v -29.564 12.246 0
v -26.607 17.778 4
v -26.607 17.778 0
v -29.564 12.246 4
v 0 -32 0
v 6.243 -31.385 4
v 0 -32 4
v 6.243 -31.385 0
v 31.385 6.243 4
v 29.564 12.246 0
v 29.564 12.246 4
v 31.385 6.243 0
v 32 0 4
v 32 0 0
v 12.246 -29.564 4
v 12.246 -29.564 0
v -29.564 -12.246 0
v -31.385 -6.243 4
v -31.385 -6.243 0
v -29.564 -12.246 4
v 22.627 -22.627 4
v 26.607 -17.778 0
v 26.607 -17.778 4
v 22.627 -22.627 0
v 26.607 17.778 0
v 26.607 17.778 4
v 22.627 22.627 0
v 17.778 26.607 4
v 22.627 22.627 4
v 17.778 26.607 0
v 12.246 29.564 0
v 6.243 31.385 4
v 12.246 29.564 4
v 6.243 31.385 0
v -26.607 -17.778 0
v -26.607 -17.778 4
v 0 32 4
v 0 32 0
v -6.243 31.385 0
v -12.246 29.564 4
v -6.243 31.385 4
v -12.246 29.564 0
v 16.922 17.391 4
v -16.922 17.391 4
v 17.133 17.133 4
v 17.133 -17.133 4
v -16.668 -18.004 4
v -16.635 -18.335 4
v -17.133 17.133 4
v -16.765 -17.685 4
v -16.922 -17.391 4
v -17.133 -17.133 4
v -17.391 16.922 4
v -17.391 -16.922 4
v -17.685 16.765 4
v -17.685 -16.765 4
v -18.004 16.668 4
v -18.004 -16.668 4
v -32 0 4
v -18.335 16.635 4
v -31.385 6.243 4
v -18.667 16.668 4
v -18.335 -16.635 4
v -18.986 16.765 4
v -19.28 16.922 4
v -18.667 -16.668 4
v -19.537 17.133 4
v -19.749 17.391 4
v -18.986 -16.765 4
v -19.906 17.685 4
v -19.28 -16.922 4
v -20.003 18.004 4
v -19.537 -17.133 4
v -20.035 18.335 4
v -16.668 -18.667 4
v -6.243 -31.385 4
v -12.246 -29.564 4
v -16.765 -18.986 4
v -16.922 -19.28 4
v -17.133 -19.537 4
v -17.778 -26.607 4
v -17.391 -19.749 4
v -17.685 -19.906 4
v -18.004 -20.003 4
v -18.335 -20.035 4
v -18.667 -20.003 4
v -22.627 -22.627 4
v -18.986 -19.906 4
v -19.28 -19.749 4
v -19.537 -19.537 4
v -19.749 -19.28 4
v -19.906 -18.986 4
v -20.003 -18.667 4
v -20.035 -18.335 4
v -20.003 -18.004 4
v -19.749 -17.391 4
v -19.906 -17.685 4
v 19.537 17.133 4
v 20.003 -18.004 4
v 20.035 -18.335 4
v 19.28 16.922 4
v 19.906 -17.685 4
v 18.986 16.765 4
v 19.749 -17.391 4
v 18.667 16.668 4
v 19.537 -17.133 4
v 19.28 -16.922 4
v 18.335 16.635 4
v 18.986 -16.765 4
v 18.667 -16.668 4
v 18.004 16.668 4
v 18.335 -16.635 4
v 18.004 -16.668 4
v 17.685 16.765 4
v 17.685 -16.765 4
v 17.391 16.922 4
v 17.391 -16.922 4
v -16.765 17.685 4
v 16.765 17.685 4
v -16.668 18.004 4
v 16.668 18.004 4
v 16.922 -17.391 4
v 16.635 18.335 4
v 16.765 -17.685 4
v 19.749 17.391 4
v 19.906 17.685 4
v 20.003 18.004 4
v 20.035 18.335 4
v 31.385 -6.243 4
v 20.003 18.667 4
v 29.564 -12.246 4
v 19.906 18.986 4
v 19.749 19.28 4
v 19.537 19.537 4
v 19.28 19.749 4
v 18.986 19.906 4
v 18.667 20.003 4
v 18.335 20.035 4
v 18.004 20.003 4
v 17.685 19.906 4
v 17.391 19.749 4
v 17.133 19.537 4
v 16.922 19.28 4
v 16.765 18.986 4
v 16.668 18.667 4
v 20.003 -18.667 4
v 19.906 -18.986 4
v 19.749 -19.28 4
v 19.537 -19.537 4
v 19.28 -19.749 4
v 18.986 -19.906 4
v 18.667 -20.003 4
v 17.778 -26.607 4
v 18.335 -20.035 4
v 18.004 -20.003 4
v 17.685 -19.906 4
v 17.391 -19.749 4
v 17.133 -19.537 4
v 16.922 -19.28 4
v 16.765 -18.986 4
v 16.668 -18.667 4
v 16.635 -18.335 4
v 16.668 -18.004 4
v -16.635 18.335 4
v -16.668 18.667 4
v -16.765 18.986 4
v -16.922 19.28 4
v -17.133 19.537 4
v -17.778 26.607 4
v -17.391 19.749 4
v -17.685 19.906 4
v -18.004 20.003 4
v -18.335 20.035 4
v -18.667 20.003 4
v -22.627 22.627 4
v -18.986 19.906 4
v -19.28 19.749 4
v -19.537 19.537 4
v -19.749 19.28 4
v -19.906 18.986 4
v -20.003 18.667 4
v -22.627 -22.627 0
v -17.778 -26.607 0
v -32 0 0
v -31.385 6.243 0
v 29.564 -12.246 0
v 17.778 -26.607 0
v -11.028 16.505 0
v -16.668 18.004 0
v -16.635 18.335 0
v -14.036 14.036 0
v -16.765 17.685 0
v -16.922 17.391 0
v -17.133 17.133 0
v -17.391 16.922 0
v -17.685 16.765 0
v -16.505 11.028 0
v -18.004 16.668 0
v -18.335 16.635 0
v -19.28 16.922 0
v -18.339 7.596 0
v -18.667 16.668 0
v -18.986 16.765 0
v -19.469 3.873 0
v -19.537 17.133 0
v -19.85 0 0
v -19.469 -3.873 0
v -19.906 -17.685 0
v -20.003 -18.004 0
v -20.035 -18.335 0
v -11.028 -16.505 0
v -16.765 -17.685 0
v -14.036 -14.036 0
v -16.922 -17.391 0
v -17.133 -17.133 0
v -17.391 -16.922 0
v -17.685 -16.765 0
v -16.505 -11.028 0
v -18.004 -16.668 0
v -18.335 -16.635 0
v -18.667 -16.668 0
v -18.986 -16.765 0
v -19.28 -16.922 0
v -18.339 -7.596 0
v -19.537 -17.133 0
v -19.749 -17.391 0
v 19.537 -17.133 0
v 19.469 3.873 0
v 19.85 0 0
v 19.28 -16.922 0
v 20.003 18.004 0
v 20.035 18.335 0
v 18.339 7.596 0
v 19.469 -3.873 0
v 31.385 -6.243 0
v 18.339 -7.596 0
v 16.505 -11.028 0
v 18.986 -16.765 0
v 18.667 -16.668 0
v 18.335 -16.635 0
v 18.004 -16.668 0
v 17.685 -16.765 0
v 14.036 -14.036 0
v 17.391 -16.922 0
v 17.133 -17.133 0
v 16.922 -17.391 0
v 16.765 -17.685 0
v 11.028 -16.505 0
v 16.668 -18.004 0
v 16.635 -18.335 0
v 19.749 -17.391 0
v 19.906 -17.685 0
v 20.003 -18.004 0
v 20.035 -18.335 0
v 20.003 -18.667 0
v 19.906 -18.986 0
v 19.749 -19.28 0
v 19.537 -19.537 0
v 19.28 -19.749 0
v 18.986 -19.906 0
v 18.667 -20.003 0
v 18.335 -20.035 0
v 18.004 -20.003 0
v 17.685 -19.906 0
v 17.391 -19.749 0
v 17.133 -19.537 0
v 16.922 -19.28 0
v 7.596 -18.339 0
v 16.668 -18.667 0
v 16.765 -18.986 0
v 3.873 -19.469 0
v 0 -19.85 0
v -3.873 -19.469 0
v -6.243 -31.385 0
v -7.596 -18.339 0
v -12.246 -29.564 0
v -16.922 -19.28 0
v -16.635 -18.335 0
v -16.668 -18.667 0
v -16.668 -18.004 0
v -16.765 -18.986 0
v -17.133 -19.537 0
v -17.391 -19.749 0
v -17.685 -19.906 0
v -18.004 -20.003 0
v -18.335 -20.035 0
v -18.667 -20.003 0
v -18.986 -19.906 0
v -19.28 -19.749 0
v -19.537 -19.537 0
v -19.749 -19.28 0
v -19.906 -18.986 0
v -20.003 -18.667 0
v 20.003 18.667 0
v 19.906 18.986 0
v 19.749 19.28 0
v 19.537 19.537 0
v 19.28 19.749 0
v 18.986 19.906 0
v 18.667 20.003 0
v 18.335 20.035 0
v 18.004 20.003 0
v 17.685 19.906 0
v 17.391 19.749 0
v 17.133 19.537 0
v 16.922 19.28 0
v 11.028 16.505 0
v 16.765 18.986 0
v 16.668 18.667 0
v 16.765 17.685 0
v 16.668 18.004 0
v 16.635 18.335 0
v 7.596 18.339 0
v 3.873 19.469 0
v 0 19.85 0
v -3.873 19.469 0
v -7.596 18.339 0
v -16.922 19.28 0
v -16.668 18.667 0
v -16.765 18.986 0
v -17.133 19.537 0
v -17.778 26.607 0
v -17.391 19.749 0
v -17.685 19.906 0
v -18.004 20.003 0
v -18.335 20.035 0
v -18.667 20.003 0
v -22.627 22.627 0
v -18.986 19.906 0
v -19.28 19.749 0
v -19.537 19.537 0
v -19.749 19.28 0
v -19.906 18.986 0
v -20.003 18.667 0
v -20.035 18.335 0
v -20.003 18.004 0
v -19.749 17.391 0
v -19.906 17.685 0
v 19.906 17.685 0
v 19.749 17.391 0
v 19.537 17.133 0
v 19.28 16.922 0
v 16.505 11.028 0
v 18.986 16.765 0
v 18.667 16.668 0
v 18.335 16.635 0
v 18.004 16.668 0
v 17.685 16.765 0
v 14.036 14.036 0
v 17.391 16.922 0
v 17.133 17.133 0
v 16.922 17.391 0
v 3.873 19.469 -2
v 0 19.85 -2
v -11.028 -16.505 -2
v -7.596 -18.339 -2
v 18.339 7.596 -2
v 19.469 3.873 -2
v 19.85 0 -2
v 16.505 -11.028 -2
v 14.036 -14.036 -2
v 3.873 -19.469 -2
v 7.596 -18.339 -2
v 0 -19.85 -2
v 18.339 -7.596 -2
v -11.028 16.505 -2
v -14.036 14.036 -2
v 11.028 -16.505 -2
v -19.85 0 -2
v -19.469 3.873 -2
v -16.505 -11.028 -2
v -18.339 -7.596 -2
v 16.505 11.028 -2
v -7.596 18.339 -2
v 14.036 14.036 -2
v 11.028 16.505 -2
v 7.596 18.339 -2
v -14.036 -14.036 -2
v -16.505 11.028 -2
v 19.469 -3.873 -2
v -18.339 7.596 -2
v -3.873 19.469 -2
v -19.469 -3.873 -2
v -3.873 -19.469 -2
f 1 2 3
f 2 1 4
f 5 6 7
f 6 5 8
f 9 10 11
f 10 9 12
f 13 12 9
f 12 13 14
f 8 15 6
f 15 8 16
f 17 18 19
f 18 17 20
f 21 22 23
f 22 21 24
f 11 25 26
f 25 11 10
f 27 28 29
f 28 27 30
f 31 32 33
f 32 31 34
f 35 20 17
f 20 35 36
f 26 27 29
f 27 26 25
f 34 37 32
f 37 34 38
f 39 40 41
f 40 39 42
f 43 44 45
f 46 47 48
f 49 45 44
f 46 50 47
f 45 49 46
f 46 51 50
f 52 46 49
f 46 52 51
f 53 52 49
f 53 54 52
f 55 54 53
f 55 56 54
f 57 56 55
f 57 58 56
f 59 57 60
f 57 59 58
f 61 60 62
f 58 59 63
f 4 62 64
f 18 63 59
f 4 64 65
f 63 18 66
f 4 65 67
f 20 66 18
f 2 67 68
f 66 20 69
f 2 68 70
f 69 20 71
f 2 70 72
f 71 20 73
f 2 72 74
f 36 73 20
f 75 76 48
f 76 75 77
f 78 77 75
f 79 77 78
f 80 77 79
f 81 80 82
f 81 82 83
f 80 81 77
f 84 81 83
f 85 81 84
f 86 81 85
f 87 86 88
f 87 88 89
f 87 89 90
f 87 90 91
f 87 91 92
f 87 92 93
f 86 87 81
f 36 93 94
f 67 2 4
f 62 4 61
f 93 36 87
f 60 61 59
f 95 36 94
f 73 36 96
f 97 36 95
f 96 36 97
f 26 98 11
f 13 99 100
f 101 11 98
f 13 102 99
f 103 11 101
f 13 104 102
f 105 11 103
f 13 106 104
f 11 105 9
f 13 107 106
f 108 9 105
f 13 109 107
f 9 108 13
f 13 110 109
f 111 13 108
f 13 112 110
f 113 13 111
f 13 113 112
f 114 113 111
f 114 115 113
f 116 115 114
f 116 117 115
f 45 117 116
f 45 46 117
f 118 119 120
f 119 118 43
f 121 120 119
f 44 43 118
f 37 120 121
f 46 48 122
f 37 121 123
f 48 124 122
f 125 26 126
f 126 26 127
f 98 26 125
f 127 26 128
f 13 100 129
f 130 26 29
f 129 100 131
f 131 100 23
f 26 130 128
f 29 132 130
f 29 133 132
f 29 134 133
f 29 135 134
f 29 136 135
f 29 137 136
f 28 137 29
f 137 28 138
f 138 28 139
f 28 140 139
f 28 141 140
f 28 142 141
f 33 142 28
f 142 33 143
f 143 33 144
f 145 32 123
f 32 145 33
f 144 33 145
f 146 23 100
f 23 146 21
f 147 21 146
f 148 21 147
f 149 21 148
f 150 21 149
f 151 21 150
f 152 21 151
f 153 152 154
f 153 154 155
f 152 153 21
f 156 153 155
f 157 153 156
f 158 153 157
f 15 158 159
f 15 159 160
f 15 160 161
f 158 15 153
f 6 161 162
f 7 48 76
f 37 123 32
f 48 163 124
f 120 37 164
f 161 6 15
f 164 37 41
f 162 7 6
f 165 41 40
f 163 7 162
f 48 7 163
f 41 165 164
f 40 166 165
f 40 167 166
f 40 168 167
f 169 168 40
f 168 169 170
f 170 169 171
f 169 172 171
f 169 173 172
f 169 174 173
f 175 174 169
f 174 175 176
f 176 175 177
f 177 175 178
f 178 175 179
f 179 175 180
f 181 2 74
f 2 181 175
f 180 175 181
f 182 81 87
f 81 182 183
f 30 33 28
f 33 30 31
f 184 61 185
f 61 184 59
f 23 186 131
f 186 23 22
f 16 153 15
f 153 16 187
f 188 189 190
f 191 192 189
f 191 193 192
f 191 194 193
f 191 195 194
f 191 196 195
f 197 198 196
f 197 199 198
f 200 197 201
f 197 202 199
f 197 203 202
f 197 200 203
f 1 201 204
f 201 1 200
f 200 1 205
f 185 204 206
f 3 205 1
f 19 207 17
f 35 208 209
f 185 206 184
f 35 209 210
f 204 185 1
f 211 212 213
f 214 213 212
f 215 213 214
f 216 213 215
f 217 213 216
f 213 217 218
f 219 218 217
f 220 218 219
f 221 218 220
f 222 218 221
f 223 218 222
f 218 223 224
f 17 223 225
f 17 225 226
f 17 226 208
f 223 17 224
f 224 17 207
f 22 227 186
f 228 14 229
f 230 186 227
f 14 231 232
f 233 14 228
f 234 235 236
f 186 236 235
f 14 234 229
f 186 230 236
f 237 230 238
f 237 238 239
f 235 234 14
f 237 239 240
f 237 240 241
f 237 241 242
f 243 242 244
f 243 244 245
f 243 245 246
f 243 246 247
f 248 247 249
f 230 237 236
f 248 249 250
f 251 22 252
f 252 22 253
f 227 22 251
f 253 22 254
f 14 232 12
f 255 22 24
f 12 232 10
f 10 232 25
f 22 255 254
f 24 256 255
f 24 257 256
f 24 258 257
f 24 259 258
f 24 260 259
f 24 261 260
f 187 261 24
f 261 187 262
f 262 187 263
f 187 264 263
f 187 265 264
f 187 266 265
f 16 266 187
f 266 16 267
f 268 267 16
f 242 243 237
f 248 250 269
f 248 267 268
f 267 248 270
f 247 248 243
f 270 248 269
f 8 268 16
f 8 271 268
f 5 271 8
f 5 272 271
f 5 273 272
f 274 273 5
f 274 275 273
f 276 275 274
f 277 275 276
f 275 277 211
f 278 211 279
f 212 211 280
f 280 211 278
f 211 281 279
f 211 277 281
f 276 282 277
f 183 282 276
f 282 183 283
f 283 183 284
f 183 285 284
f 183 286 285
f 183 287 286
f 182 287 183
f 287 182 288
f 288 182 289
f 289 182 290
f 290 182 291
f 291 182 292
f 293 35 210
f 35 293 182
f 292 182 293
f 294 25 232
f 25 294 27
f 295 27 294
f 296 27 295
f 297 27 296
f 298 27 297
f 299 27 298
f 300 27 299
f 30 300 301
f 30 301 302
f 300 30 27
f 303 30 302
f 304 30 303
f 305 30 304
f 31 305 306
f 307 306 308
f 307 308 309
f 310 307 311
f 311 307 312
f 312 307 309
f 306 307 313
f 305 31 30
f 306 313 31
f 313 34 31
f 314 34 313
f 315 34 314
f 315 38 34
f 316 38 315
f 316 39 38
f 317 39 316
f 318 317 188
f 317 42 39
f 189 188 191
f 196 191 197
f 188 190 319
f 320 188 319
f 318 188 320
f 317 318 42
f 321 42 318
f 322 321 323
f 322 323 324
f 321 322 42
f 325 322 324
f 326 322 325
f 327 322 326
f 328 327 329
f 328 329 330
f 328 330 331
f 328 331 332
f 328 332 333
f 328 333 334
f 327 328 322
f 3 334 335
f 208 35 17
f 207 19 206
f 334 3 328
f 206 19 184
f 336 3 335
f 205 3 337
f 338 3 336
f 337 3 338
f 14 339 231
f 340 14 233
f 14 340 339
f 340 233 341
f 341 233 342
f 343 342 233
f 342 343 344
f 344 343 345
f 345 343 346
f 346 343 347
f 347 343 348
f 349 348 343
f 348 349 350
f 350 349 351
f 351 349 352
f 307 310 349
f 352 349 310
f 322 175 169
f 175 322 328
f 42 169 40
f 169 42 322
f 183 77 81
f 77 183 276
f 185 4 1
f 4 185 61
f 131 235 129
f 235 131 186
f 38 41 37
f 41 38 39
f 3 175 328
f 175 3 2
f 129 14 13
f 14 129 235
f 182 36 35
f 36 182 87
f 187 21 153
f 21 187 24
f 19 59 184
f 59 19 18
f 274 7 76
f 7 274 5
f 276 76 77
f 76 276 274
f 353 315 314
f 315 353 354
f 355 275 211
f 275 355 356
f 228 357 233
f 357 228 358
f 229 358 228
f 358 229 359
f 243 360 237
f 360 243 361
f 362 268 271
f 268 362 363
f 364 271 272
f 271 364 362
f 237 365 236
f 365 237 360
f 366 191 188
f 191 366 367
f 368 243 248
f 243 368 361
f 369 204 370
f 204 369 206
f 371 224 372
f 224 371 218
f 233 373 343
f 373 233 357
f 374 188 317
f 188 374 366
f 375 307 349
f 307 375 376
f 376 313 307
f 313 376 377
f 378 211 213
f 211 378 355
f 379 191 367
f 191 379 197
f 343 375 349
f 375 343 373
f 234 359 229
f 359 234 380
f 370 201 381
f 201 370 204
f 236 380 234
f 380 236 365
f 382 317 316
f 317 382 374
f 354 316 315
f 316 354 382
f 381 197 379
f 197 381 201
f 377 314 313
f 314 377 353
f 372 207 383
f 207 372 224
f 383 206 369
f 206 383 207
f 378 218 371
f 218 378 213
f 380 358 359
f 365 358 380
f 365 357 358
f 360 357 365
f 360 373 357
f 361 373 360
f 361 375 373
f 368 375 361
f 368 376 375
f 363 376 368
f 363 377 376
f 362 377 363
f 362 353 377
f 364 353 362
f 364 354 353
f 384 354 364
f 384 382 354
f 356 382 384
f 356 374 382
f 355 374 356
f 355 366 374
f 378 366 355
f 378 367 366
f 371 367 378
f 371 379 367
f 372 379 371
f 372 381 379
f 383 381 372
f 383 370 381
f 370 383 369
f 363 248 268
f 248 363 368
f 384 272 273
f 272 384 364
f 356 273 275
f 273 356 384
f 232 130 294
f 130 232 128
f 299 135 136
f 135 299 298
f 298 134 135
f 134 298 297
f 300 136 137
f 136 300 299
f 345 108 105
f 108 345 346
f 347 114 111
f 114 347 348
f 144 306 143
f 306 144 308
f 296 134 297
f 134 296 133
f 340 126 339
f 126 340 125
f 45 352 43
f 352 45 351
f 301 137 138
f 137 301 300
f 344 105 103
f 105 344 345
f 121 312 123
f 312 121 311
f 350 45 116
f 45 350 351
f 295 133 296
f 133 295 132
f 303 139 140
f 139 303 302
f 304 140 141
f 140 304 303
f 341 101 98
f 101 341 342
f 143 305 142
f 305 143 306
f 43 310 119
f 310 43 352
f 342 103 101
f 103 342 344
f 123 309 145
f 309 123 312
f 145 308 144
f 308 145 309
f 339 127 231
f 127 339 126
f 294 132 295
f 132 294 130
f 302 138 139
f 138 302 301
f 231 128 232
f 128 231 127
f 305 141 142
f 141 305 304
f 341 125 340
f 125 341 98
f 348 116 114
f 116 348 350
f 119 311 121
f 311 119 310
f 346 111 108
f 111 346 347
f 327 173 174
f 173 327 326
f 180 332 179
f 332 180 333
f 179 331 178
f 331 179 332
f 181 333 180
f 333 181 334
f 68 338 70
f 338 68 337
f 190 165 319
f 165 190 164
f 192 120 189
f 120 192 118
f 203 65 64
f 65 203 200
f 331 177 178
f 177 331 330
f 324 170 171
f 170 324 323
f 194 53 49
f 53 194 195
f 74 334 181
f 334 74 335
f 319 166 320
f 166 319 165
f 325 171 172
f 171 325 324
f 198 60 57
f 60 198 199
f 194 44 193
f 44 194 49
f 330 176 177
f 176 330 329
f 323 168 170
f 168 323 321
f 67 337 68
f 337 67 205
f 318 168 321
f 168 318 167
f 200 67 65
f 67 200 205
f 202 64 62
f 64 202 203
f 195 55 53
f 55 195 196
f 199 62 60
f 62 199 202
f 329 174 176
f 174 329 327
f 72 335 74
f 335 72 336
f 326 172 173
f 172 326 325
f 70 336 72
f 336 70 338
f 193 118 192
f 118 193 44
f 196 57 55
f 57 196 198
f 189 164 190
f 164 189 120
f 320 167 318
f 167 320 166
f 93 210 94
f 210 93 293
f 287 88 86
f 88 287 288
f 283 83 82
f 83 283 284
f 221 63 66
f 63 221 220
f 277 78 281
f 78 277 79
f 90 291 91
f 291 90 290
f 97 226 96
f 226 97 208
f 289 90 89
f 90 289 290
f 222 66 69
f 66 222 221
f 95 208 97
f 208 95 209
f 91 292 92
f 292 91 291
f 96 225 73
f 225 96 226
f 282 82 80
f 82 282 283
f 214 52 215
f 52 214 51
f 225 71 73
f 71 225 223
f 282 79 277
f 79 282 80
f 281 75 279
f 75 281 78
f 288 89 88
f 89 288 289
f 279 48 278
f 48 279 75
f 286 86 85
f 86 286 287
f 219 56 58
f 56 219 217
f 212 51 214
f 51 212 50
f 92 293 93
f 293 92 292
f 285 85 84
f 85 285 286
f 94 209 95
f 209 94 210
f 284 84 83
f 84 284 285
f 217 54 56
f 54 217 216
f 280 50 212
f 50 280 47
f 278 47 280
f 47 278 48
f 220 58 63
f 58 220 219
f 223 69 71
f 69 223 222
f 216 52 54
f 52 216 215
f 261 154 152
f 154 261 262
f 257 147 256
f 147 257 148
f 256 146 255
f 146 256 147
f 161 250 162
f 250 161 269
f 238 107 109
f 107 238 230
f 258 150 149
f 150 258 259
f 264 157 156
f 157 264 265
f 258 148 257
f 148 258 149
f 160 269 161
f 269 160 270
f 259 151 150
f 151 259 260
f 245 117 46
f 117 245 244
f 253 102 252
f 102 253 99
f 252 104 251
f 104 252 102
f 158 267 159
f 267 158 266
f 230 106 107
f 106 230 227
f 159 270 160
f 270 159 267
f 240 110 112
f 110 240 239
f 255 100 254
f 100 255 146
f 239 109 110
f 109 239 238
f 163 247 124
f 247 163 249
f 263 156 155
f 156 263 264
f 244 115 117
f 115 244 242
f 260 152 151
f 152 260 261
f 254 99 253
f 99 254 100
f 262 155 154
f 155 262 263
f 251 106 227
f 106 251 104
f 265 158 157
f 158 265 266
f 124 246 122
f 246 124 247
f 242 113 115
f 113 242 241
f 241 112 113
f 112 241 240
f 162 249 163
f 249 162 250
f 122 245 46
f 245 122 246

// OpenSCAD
$fn = 32;

// ----------------------------------------------------------------------
// Retaining cap: 6203 cover, 64 mm, spigot 39.7 mm
// ----------------------------------------------------------------------

// --- parameters (mm) ---
cover_d = 64;             // cover diameter
cover_t = 4;              // cover thickness
spigot_d = 39.7;          // spigot that enters the housing
spigot_h = 2;             // spigot height
bolt_d = 3.4;             // bolt clearance
bolt_r = 25.93;           // bolt circle radius

module cover() {
  cylinder(h = cover_t, d = cover_d);
}

module spigot() {
  /* sunk 1 mm into the cover; the spigot sets the overall height */
  translate([0, 0, -spigot_h]) cylinder(h = spigot_h + 1, d = spigot_d);
}

difference() {
  union() {
    cover();
    spigot();
  }
  for (i = [0 : 3]) rotate([0, 0, 45 + i * 90]) translate([bolt_r, 0, -spigot_h - 1])
    cylinder(h = spigot_h + cover_t + 2, d = bolt_d);
}
